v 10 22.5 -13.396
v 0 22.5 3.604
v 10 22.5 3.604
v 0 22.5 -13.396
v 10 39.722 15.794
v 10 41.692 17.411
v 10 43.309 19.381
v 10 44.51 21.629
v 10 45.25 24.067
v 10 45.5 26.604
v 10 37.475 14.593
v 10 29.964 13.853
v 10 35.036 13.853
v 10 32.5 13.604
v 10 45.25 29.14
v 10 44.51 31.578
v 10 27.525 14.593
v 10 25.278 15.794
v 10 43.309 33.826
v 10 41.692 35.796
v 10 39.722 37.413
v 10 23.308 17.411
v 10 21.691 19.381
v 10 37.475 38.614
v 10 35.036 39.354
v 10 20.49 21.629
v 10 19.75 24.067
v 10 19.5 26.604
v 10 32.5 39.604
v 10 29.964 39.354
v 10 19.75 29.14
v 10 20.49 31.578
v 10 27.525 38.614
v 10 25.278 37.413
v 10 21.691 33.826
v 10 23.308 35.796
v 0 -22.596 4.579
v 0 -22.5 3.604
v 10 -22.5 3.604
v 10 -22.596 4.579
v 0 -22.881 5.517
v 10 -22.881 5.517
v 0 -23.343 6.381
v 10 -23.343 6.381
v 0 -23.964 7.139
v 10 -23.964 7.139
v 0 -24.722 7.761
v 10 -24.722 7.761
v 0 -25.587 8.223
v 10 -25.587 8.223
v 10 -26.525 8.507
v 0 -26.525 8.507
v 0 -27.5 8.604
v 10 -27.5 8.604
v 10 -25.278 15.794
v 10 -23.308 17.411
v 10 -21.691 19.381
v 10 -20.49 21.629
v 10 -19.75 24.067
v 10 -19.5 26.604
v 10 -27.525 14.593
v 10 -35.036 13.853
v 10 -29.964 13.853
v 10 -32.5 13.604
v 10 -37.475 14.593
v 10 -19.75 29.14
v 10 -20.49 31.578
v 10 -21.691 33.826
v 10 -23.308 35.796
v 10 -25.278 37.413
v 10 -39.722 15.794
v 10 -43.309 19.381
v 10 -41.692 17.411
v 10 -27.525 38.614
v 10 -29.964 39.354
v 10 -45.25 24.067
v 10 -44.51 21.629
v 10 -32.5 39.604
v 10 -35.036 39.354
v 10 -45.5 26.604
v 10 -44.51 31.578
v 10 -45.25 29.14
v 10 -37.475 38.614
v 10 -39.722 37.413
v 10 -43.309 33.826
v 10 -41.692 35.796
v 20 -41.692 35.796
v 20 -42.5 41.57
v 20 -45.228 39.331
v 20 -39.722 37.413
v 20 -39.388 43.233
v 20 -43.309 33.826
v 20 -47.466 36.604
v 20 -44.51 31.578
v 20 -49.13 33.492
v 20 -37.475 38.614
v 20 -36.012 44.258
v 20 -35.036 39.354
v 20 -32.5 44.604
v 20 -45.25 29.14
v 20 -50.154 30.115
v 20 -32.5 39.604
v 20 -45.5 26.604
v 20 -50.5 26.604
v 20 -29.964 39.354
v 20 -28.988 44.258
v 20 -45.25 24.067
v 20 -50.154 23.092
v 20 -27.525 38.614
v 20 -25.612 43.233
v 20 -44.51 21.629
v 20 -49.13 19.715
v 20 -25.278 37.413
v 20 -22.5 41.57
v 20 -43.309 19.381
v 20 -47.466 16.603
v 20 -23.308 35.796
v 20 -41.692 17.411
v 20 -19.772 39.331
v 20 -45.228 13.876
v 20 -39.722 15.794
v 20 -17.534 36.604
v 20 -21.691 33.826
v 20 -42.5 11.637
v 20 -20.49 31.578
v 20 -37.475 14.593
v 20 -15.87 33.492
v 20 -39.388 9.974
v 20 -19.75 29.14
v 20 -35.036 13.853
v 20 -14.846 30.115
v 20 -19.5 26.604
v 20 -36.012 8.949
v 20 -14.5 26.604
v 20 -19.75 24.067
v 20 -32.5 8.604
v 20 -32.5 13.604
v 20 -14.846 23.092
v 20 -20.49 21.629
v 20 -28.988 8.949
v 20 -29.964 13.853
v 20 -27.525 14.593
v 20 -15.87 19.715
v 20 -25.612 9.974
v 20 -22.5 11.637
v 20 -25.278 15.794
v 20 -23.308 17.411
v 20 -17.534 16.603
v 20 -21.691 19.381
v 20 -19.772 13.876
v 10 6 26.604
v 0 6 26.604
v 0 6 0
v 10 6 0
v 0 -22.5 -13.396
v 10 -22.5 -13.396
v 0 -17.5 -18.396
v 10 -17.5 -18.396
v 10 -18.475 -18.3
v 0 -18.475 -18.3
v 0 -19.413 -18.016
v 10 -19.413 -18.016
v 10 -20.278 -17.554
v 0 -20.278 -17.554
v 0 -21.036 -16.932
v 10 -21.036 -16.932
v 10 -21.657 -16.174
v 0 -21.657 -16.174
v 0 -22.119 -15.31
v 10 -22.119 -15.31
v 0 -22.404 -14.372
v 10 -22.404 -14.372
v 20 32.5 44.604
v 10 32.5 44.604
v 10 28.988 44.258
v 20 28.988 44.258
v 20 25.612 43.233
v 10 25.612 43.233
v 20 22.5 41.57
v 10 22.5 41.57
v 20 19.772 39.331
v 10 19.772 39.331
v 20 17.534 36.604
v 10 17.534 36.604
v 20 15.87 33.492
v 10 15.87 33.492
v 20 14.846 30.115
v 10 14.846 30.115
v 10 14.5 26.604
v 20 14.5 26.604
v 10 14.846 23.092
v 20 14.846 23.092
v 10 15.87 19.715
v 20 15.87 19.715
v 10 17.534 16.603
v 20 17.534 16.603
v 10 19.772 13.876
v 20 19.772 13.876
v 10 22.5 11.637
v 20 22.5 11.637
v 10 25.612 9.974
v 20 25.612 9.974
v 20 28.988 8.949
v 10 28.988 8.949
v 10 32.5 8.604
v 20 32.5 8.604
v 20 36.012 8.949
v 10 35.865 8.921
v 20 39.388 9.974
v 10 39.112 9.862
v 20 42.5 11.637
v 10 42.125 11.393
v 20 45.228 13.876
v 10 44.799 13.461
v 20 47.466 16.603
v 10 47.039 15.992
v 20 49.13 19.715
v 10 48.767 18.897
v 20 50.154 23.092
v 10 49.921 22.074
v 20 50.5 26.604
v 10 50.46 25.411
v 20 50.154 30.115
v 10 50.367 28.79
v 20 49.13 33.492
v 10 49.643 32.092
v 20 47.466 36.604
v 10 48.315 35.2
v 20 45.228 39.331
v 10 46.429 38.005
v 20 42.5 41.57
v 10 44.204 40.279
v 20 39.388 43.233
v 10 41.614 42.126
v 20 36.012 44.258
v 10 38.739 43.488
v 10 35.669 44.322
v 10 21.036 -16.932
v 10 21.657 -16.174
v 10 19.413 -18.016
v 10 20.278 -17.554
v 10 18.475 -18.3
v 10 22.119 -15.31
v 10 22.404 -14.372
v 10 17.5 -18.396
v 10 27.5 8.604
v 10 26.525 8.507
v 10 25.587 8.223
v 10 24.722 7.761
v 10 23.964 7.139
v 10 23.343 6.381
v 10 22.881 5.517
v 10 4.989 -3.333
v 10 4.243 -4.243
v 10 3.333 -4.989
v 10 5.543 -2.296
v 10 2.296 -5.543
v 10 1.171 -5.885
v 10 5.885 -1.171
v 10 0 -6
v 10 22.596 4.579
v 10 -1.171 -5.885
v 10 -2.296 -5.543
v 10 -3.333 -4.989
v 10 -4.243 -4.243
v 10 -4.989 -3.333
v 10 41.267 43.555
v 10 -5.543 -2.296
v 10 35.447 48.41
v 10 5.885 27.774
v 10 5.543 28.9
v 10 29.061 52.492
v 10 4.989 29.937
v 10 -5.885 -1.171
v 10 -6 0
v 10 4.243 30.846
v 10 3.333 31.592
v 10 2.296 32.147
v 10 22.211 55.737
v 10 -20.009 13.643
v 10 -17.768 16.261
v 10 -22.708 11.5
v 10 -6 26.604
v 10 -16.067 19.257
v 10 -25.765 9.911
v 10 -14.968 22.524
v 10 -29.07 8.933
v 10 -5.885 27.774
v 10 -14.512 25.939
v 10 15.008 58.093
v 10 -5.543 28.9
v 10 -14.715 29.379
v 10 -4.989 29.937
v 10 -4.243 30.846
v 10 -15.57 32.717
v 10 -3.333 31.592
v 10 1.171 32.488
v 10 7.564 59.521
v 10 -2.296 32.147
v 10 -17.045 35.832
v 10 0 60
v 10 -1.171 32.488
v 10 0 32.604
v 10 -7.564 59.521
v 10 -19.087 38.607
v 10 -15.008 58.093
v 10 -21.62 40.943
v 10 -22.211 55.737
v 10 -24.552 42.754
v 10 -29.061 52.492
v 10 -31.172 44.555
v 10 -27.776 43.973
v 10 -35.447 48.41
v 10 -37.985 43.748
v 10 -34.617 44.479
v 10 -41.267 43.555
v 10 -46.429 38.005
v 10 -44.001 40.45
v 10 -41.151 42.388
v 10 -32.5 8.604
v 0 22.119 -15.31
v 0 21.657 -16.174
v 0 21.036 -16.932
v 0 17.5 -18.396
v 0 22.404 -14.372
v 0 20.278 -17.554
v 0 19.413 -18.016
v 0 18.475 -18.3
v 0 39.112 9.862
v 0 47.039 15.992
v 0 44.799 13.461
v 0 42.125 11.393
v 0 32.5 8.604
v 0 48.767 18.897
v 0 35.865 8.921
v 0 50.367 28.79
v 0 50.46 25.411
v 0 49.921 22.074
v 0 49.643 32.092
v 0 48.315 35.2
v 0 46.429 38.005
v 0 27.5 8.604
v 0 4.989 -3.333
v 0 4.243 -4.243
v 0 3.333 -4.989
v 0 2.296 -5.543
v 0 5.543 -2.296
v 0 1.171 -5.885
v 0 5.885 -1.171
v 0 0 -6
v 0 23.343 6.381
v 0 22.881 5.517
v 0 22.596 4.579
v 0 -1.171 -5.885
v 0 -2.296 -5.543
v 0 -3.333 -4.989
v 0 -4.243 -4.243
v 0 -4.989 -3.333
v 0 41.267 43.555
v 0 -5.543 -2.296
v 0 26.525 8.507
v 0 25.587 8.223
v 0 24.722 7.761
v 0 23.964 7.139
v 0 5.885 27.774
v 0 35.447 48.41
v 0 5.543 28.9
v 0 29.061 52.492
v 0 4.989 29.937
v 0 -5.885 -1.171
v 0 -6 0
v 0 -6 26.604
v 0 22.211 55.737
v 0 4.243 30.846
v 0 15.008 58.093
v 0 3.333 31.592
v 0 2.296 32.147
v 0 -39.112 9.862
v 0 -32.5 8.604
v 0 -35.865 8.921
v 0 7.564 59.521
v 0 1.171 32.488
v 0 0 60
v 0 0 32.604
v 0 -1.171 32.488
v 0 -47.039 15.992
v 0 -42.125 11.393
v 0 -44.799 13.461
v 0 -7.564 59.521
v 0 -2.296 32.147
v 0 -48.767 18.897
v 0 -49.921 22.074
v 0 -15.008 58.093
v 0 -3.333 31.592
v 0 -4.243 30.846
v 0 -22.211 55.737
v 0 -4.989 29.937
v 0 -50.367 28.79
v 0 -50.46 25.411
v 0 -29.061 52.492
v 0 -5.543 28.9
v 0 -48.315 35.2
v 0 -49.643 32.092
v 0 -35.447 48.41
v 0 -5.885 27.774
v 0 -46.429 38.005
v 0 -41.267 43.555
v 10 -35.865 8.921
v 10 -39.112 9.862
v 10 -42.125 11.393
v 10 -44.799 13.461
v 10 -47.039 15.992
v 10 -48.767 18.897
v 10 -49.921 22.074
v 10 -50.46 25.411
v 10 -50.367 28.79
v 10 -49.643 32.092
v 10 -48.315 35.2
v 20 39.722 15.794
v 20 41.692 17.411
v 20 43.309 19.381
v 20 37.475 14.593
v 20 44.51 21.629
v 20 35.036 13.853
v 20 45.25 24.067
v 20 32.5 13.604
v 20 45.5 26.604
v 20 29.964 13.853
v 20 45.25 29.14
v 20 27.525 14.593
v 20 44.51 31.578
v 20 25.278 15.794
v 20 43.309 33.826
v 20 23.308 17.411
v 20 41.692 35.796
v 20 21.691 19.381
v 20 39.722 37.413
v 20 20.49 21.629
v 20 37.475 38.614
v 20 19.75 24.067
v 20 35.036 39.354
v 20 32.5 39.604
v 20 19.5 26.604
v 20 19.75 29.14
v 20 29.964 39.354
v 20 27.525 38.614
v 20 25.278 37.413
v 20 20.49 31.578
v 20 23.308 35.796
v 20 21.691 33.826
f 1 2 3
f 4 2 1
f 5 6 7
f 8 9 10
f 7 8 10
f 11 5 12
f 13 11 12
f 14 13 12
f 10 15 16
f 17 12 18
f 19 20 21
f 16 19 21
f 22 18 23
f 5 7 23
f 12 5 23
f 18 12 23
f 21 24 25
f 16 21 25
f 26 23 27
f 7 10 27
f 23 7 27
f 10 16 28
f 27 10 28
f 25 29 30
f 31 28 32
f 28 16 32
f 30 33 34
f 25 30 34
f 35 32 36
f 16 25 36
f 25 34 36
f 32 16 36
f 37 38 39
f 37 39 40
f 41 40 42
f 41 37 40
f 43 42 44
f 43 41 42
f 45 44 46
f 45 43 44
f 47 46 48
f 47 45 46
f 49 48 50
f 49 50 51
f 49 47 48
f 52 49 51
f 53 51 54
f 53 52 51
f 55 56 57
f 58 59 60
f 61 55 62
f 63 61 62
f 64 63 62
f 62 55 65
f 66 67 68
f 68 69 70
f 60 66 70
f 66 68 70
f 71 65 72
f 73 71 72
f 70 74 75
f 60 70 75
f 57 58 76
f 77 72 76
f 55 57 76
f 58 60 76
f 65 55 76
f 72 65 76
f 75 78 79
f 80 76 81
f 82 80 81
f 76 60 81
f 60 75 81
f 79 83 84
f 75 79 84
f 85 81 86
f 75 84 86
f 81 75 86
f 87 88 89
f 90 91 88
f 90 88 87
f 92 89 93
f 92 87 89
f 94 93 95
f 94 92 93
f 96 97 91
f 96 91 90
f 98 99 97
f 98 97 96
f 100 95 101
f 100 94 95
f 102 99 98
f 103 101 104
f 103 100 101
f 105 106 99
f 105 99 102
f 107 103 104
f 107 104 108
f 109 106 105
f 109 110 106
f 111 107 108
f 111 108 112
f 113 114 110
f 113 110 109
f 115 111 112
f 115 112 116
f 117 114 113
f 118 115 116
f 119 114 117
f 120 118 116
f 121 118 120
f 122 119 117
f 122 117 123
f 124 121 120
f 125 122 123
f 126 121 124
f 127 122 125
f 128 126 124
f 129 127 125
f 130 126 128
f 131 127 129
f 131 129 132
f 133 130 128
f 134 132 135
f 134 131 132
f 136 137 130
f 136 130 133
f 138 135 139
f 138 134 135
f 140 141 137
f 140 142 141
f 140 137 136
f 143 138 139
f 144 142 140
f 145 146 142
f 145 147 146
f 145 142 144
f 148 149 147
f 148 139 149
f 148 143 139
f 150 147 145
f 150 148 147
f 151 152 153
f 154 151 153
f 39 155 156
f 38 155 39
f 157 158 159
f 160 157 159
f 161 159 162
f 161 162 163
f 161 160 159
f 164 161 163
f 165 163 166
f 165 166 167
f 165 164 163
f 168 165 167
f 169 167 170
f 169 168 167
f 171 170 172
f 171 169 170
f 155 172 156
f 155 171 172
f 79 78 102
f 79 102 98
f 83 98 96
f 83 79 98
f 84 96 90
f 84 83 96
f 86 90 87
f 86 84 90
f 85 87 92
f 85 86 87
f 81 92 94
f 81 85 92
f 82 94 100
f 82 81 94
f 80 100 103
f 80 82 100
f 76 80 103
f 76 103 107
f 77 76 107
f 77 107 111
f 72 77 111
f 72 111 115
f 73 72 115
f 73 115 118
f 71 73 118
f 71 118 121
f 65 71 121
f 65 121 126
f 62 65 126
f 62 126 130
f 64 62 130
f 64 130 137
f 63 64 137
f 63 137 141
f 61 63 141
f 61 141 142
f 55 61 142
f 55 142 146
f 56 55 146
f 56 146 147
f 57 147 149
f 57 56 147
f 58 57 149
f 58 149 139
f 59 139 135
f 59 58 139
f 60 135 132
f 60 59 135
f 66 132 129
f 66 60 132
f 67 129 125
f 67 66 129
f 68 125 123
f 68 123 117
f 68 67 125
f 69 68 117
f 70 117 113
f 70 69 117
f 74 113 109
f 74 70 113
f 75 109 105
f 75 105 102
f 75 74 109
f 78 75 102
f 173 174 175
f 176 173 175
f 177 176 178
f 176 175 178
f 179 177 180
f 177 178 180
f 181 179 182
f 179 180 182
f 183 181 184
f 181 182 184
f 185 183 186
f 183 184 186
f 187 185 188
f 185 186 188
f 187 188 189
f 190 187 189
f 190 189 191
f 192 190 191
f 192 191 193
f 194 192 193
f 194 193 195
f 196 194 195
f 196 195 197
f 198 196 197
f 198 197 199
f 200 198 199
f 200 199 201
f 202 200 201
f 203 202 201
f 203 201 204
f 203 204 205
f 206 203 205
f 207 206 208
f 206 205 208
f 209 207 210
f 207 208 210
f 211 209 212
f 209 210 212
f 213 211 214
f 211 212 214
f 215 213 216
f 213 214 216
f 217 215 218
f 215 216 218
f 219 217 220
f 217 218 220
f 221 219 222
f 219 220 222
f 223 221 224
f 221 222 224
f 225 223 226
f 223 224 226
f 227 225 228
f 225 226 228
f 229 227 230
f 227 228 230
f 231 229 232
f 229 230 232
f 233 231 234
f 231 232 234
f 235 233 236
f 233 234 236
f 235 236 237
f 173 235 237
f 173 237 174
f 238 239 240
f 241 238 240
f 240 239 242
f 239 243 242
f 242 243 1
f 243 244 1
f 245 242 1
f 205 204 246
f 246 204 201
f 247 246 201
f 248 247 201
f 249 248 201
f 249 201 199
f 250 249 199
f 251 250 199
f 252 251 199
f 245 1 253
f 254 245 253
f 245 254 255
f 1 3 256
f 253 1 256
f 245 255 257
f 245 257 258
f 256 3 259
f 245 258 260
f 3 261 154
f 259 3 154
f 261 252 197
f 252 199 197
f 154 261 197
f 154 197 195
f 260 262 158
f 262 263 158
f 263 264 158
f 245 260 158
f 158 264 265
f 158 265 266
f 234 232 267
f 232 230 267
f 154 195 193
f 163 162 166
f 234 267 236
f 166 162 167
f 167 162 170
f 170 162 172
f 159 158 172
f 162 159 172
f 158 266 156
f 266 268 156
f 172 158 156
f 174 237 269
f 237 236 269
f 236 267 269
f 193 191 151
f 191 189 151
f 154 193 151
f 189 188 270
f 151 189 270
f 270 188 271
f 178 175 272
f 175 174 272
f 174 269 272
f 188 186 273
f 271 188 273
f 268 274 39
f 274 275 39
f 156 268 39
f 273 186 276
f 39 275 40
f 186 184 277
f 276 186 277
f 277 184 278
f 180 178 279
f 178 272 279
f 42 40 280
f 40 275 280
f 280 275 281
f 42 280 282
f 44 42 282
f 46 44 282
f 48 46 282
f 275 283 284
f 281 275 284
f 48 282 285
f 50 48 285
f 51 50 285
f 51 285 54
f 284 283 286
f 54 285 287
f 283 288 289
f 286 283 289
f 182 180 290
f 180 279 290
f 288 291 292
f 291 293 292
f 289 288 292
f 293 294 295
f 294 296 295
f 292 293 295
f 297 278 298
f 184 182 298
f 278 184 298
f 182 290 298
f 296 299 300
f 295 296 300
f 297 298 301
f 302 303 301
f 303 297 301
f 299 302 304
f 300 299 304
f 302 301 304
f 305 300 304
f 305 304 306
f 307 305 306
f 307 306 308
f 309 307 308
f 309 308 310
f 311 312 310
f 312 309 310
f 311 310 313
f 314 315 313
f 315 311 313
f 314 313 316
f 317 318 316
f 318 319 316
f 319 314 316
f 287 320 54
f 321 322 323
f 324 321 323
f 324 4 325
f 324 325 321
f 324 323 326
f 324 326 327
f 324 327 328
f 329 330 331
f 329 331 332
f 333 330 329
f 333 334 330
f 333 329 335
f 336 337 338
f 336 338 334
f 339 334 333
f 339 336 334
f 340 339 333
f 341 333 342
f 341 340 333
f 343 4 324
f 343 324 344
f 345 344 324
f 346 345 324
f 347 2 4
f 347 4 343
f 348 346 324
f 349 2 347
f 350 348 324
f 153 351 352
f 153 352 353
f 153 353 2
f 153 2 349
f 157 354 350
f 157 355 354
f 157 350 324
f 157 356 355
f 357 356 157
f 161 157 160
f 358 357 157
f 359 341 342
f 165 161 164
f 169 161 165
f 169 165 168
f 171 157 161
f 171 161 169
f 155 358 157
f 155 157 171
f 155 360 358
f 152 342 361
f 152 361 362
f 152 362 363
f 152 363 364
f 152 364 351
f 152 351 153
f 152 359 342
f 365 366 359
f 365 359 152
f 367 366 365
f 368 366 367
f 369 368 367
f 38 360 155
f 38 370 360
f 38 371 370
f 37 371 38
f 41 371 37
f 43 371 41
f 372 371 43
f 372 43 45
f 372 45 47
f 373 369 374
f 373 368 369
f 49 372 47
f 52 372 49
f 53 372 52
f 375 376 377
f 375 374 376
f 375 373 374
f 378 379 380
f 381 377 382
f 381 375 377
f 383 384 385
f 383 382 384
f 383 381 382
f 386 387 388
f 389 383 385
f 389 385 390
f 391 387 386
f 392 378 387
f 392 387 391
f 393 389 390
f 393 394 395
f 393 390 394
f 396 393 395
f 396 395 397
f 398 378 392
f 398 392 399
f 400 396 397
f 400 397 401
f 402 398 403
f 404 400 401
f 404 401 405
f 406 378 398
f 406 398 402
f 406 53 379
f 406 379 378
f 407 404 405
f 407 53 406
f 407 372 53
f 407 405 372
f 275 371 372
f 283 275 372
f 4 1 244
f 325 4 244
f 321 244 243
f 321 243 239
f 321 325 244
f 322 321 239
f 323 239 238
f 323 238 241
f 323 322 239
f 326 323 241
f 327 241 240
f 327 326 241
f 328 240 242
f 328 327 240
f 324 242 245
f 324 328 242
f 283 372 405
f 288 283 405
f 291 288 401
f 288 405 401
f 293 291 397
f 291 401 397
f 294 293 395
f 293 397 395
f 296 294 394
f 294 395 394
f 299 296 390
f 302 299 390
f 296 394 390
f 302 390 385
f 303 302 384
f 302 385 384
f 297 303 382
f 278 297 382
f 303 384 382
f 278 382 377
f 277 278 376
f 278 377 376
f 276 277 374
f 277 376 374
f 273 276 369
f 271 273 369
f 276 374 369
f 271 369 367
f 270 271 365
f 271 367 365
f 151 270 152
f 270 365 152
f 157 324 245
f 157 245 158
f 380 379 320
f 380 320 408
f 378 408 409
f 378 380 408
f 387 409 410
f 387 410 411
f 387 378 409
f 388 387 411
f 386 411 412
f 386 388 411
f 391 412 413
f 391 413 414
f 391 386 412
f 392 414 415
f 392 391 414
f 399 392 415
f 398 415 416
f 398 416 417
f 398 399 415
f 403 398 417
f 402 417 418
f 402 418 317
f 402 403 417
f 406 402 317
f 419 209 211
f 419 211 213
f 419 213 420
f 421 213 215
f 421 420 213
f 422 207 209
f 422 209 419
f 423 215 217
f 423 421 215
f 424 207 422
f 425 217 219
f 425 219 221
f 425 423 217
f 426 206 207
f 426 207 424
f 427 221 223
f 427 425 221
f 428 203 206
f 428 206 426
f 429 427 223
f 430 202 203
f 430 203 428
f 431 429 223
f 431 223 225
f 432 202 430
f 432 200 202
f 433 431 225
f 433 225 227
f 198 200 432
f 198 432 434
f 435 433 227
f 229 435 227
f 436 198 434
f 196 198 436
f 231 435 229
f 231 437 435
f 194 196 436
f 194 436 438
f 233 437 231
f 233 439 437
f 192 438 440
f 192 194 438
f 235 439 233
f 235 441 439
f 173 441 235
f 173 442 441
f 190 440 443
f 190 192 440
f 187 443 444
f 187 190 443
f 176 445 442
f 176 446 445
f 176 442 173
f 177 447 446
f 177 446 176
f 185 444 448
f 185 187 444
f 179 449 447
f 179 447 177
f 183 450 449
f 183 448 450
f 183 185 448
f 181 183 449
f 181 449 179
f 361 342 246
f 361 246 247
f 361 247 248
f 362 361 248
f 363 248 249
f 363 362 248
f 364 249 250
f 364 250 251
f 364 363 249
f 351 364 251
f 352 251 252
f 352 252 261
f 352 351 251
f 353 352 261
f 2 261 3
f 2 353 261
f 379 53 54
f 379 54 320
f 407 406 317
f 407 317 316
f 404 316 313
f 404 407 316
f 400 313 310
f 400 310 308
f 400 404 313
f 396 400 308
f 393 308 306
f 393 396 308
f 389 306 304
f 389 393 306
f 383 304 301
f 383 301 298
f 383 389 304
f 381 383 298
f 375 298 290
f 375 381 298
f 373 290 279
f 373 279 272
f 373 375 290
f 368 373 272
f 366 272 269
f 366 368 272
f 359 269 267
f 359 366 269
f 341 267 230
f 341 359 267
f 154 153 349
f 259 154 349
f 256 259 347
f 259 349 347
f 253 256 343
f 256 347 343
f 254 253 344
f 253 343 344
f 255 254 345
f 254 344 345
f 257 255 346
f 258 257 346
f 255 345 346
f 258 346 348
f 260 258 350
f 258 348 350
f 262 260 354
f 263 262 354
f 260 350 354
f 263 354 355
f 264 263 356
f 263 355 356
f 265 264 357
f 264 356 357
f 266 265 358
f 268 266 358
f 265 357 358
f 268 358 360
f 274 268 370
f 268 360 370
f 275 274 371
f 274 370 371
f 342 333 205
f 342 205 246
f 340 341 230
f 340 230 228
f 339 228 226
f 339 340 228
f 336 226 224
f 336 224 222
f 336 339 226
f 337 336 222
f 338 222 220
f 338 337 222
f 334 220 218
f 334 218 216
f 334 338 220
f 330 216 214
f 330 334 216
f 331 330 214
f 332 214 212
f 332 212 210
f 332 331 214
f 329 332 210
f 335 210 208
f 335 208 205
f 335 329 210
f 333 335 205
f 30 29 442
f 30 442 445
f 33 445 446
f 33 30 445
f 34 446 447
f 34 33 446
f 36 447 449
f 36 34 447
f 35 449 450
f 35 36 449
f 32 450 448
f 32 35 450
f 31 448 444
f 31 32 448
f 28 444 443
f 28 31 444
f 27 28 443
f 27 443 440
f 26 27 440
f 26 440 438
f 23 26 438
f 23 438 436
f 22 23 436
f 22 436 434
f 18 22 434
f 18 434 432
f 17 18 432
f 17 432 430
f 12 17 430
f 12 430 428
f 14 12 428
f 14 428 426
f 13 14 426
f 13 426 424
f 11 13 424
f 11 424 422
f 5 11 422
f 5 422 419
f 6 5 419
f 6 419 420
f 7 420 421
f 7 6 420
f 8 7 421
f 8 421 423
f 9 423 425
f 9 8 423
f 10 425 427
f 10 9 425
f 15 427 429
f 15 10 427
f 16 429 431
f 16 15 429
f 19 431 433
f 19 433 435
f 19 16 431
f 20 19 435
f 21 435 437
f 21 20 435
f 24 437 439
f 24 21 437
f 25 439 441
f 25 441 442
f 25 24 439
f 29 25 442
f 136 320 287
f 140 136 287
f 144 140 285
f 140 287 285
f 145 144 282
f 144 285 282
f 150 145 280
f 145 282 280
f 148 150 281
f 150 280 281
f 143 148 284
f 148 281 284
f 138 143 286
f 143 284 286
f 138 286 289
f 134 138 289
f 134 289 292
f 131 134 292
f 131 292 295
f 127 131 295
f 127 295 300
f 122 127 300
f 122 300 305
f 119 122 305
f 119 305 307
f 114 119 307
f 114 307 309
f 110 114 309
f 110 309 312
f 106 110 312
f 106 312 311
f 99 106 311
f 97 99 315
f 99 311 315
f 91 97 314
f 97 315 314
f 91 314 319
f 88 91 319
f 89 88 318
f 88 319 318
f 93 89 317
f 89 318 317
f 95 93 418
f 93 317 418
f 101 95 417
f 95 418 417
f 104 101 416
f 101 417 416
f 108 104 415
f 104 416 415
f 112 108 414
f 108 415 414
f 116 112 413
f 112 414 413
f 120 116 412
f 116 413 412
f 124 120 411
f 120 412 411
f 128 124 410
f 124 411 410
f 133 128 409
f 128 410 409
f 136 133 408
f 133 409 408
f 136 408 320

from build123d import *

# Parameters (mm, degrees)
BOSS_EXTRUDE1_DEPTH = 10
SKETCH3_R           = 18
SKETCH3_R_2         = 13
BOSS_EXTRUDE2_DEPTH = 20


with BuildPart() as part:
    # Sketch2 → Boss-Extrude1 (new body)
    with BuildSketch(Plane.YZ):
        with BuildLine():
            Line((32.5, 8.603571189), (27.5, 8.603571189))
            ThreePointArc((27.5, 8.603571189), (23.964466094, 7.139105095), (22.5, 3.603571189))
            Line((22.5, 3.603571189), (22.5, -13.396428811))
            ThreePointArc((22.5, -13.396428811), (21.035533906, -16.931962717), (17.5, -18.396428811))
            Line((17.5, -18.396428811), (-17.5, -18.396428811))
            ThreePointArc((-17.5, -18.396428811), (-21.035533906, -16.931962717), (-22.5, -13.396428811))
            Line((-22.5, -13.396428811), (-22.5, 3.603571189))
            ThreePointArc((-22.5, 3.603571189), (-23.964466094, 7.139105095), (-27.5, 8.603571189))
            Line((-27.5, 8.603571189), (-32.5, 8.603571189))
            ThreePointArc((-32.5, 8.603571189), (-48.766953451, 18.897325318), (-46.428571429, 38.005101698))
            ThreePointArc((-46.428571429, 38.005101698), (0, 60), (46.428571429, 38.005101698))
            ThreePointArc((46.428571429, 38.005101698), (48.766953451, 18.897325318), (32.5, 8.603571189))
        make_face()
        with BuildLine():
            Line((6, 26.603571189), (6, 0))
            ThreePointArc((6, 0), (0, -6), (-6, 0))
            Line((-6, 0), (-6, 26.603571189))
            ThreePointArc((-6, 26.603571189), (0, 32.603571189), (6, 26.603571189))
        make_face(mode=Mode.SUBTRACT)
    extrude(amount=BOSS_EXTRUDE1_DEPTH)

    # Sketch3 → Boss-Extrude2 (add)
    # profile 1 of 2: a face of its own
    with BuildSketch(Plane.YZ):
        with Locations(Location((-32.5, 26.603571189, 0), (0, 0, 270))):
            Circle(SKETCH3_R)
        with Locations(Location((-32.5, 26.603571189, 0), (0, 0, 90))):
            Circle(SKETCH3_R_2, mode=Mode.SUBTRACT)
    # profile 2 of 2: a face of its own
    with BuildSketch(Plane.YZ):
        with Locations(Location((32.5, 26.603571189, 0), (0, 0, 90))):
            Circle(SKETCH3_R)
        with Locations(Location((32.5, 26.603571189, 0), (0, 0, 90))):
            Circle(SKETCH3_R_2, mode=Mode.SUBTRACT)
    extrude(amount=BOSS_EXTRUDE2_DEPTH)


solid = part.part
